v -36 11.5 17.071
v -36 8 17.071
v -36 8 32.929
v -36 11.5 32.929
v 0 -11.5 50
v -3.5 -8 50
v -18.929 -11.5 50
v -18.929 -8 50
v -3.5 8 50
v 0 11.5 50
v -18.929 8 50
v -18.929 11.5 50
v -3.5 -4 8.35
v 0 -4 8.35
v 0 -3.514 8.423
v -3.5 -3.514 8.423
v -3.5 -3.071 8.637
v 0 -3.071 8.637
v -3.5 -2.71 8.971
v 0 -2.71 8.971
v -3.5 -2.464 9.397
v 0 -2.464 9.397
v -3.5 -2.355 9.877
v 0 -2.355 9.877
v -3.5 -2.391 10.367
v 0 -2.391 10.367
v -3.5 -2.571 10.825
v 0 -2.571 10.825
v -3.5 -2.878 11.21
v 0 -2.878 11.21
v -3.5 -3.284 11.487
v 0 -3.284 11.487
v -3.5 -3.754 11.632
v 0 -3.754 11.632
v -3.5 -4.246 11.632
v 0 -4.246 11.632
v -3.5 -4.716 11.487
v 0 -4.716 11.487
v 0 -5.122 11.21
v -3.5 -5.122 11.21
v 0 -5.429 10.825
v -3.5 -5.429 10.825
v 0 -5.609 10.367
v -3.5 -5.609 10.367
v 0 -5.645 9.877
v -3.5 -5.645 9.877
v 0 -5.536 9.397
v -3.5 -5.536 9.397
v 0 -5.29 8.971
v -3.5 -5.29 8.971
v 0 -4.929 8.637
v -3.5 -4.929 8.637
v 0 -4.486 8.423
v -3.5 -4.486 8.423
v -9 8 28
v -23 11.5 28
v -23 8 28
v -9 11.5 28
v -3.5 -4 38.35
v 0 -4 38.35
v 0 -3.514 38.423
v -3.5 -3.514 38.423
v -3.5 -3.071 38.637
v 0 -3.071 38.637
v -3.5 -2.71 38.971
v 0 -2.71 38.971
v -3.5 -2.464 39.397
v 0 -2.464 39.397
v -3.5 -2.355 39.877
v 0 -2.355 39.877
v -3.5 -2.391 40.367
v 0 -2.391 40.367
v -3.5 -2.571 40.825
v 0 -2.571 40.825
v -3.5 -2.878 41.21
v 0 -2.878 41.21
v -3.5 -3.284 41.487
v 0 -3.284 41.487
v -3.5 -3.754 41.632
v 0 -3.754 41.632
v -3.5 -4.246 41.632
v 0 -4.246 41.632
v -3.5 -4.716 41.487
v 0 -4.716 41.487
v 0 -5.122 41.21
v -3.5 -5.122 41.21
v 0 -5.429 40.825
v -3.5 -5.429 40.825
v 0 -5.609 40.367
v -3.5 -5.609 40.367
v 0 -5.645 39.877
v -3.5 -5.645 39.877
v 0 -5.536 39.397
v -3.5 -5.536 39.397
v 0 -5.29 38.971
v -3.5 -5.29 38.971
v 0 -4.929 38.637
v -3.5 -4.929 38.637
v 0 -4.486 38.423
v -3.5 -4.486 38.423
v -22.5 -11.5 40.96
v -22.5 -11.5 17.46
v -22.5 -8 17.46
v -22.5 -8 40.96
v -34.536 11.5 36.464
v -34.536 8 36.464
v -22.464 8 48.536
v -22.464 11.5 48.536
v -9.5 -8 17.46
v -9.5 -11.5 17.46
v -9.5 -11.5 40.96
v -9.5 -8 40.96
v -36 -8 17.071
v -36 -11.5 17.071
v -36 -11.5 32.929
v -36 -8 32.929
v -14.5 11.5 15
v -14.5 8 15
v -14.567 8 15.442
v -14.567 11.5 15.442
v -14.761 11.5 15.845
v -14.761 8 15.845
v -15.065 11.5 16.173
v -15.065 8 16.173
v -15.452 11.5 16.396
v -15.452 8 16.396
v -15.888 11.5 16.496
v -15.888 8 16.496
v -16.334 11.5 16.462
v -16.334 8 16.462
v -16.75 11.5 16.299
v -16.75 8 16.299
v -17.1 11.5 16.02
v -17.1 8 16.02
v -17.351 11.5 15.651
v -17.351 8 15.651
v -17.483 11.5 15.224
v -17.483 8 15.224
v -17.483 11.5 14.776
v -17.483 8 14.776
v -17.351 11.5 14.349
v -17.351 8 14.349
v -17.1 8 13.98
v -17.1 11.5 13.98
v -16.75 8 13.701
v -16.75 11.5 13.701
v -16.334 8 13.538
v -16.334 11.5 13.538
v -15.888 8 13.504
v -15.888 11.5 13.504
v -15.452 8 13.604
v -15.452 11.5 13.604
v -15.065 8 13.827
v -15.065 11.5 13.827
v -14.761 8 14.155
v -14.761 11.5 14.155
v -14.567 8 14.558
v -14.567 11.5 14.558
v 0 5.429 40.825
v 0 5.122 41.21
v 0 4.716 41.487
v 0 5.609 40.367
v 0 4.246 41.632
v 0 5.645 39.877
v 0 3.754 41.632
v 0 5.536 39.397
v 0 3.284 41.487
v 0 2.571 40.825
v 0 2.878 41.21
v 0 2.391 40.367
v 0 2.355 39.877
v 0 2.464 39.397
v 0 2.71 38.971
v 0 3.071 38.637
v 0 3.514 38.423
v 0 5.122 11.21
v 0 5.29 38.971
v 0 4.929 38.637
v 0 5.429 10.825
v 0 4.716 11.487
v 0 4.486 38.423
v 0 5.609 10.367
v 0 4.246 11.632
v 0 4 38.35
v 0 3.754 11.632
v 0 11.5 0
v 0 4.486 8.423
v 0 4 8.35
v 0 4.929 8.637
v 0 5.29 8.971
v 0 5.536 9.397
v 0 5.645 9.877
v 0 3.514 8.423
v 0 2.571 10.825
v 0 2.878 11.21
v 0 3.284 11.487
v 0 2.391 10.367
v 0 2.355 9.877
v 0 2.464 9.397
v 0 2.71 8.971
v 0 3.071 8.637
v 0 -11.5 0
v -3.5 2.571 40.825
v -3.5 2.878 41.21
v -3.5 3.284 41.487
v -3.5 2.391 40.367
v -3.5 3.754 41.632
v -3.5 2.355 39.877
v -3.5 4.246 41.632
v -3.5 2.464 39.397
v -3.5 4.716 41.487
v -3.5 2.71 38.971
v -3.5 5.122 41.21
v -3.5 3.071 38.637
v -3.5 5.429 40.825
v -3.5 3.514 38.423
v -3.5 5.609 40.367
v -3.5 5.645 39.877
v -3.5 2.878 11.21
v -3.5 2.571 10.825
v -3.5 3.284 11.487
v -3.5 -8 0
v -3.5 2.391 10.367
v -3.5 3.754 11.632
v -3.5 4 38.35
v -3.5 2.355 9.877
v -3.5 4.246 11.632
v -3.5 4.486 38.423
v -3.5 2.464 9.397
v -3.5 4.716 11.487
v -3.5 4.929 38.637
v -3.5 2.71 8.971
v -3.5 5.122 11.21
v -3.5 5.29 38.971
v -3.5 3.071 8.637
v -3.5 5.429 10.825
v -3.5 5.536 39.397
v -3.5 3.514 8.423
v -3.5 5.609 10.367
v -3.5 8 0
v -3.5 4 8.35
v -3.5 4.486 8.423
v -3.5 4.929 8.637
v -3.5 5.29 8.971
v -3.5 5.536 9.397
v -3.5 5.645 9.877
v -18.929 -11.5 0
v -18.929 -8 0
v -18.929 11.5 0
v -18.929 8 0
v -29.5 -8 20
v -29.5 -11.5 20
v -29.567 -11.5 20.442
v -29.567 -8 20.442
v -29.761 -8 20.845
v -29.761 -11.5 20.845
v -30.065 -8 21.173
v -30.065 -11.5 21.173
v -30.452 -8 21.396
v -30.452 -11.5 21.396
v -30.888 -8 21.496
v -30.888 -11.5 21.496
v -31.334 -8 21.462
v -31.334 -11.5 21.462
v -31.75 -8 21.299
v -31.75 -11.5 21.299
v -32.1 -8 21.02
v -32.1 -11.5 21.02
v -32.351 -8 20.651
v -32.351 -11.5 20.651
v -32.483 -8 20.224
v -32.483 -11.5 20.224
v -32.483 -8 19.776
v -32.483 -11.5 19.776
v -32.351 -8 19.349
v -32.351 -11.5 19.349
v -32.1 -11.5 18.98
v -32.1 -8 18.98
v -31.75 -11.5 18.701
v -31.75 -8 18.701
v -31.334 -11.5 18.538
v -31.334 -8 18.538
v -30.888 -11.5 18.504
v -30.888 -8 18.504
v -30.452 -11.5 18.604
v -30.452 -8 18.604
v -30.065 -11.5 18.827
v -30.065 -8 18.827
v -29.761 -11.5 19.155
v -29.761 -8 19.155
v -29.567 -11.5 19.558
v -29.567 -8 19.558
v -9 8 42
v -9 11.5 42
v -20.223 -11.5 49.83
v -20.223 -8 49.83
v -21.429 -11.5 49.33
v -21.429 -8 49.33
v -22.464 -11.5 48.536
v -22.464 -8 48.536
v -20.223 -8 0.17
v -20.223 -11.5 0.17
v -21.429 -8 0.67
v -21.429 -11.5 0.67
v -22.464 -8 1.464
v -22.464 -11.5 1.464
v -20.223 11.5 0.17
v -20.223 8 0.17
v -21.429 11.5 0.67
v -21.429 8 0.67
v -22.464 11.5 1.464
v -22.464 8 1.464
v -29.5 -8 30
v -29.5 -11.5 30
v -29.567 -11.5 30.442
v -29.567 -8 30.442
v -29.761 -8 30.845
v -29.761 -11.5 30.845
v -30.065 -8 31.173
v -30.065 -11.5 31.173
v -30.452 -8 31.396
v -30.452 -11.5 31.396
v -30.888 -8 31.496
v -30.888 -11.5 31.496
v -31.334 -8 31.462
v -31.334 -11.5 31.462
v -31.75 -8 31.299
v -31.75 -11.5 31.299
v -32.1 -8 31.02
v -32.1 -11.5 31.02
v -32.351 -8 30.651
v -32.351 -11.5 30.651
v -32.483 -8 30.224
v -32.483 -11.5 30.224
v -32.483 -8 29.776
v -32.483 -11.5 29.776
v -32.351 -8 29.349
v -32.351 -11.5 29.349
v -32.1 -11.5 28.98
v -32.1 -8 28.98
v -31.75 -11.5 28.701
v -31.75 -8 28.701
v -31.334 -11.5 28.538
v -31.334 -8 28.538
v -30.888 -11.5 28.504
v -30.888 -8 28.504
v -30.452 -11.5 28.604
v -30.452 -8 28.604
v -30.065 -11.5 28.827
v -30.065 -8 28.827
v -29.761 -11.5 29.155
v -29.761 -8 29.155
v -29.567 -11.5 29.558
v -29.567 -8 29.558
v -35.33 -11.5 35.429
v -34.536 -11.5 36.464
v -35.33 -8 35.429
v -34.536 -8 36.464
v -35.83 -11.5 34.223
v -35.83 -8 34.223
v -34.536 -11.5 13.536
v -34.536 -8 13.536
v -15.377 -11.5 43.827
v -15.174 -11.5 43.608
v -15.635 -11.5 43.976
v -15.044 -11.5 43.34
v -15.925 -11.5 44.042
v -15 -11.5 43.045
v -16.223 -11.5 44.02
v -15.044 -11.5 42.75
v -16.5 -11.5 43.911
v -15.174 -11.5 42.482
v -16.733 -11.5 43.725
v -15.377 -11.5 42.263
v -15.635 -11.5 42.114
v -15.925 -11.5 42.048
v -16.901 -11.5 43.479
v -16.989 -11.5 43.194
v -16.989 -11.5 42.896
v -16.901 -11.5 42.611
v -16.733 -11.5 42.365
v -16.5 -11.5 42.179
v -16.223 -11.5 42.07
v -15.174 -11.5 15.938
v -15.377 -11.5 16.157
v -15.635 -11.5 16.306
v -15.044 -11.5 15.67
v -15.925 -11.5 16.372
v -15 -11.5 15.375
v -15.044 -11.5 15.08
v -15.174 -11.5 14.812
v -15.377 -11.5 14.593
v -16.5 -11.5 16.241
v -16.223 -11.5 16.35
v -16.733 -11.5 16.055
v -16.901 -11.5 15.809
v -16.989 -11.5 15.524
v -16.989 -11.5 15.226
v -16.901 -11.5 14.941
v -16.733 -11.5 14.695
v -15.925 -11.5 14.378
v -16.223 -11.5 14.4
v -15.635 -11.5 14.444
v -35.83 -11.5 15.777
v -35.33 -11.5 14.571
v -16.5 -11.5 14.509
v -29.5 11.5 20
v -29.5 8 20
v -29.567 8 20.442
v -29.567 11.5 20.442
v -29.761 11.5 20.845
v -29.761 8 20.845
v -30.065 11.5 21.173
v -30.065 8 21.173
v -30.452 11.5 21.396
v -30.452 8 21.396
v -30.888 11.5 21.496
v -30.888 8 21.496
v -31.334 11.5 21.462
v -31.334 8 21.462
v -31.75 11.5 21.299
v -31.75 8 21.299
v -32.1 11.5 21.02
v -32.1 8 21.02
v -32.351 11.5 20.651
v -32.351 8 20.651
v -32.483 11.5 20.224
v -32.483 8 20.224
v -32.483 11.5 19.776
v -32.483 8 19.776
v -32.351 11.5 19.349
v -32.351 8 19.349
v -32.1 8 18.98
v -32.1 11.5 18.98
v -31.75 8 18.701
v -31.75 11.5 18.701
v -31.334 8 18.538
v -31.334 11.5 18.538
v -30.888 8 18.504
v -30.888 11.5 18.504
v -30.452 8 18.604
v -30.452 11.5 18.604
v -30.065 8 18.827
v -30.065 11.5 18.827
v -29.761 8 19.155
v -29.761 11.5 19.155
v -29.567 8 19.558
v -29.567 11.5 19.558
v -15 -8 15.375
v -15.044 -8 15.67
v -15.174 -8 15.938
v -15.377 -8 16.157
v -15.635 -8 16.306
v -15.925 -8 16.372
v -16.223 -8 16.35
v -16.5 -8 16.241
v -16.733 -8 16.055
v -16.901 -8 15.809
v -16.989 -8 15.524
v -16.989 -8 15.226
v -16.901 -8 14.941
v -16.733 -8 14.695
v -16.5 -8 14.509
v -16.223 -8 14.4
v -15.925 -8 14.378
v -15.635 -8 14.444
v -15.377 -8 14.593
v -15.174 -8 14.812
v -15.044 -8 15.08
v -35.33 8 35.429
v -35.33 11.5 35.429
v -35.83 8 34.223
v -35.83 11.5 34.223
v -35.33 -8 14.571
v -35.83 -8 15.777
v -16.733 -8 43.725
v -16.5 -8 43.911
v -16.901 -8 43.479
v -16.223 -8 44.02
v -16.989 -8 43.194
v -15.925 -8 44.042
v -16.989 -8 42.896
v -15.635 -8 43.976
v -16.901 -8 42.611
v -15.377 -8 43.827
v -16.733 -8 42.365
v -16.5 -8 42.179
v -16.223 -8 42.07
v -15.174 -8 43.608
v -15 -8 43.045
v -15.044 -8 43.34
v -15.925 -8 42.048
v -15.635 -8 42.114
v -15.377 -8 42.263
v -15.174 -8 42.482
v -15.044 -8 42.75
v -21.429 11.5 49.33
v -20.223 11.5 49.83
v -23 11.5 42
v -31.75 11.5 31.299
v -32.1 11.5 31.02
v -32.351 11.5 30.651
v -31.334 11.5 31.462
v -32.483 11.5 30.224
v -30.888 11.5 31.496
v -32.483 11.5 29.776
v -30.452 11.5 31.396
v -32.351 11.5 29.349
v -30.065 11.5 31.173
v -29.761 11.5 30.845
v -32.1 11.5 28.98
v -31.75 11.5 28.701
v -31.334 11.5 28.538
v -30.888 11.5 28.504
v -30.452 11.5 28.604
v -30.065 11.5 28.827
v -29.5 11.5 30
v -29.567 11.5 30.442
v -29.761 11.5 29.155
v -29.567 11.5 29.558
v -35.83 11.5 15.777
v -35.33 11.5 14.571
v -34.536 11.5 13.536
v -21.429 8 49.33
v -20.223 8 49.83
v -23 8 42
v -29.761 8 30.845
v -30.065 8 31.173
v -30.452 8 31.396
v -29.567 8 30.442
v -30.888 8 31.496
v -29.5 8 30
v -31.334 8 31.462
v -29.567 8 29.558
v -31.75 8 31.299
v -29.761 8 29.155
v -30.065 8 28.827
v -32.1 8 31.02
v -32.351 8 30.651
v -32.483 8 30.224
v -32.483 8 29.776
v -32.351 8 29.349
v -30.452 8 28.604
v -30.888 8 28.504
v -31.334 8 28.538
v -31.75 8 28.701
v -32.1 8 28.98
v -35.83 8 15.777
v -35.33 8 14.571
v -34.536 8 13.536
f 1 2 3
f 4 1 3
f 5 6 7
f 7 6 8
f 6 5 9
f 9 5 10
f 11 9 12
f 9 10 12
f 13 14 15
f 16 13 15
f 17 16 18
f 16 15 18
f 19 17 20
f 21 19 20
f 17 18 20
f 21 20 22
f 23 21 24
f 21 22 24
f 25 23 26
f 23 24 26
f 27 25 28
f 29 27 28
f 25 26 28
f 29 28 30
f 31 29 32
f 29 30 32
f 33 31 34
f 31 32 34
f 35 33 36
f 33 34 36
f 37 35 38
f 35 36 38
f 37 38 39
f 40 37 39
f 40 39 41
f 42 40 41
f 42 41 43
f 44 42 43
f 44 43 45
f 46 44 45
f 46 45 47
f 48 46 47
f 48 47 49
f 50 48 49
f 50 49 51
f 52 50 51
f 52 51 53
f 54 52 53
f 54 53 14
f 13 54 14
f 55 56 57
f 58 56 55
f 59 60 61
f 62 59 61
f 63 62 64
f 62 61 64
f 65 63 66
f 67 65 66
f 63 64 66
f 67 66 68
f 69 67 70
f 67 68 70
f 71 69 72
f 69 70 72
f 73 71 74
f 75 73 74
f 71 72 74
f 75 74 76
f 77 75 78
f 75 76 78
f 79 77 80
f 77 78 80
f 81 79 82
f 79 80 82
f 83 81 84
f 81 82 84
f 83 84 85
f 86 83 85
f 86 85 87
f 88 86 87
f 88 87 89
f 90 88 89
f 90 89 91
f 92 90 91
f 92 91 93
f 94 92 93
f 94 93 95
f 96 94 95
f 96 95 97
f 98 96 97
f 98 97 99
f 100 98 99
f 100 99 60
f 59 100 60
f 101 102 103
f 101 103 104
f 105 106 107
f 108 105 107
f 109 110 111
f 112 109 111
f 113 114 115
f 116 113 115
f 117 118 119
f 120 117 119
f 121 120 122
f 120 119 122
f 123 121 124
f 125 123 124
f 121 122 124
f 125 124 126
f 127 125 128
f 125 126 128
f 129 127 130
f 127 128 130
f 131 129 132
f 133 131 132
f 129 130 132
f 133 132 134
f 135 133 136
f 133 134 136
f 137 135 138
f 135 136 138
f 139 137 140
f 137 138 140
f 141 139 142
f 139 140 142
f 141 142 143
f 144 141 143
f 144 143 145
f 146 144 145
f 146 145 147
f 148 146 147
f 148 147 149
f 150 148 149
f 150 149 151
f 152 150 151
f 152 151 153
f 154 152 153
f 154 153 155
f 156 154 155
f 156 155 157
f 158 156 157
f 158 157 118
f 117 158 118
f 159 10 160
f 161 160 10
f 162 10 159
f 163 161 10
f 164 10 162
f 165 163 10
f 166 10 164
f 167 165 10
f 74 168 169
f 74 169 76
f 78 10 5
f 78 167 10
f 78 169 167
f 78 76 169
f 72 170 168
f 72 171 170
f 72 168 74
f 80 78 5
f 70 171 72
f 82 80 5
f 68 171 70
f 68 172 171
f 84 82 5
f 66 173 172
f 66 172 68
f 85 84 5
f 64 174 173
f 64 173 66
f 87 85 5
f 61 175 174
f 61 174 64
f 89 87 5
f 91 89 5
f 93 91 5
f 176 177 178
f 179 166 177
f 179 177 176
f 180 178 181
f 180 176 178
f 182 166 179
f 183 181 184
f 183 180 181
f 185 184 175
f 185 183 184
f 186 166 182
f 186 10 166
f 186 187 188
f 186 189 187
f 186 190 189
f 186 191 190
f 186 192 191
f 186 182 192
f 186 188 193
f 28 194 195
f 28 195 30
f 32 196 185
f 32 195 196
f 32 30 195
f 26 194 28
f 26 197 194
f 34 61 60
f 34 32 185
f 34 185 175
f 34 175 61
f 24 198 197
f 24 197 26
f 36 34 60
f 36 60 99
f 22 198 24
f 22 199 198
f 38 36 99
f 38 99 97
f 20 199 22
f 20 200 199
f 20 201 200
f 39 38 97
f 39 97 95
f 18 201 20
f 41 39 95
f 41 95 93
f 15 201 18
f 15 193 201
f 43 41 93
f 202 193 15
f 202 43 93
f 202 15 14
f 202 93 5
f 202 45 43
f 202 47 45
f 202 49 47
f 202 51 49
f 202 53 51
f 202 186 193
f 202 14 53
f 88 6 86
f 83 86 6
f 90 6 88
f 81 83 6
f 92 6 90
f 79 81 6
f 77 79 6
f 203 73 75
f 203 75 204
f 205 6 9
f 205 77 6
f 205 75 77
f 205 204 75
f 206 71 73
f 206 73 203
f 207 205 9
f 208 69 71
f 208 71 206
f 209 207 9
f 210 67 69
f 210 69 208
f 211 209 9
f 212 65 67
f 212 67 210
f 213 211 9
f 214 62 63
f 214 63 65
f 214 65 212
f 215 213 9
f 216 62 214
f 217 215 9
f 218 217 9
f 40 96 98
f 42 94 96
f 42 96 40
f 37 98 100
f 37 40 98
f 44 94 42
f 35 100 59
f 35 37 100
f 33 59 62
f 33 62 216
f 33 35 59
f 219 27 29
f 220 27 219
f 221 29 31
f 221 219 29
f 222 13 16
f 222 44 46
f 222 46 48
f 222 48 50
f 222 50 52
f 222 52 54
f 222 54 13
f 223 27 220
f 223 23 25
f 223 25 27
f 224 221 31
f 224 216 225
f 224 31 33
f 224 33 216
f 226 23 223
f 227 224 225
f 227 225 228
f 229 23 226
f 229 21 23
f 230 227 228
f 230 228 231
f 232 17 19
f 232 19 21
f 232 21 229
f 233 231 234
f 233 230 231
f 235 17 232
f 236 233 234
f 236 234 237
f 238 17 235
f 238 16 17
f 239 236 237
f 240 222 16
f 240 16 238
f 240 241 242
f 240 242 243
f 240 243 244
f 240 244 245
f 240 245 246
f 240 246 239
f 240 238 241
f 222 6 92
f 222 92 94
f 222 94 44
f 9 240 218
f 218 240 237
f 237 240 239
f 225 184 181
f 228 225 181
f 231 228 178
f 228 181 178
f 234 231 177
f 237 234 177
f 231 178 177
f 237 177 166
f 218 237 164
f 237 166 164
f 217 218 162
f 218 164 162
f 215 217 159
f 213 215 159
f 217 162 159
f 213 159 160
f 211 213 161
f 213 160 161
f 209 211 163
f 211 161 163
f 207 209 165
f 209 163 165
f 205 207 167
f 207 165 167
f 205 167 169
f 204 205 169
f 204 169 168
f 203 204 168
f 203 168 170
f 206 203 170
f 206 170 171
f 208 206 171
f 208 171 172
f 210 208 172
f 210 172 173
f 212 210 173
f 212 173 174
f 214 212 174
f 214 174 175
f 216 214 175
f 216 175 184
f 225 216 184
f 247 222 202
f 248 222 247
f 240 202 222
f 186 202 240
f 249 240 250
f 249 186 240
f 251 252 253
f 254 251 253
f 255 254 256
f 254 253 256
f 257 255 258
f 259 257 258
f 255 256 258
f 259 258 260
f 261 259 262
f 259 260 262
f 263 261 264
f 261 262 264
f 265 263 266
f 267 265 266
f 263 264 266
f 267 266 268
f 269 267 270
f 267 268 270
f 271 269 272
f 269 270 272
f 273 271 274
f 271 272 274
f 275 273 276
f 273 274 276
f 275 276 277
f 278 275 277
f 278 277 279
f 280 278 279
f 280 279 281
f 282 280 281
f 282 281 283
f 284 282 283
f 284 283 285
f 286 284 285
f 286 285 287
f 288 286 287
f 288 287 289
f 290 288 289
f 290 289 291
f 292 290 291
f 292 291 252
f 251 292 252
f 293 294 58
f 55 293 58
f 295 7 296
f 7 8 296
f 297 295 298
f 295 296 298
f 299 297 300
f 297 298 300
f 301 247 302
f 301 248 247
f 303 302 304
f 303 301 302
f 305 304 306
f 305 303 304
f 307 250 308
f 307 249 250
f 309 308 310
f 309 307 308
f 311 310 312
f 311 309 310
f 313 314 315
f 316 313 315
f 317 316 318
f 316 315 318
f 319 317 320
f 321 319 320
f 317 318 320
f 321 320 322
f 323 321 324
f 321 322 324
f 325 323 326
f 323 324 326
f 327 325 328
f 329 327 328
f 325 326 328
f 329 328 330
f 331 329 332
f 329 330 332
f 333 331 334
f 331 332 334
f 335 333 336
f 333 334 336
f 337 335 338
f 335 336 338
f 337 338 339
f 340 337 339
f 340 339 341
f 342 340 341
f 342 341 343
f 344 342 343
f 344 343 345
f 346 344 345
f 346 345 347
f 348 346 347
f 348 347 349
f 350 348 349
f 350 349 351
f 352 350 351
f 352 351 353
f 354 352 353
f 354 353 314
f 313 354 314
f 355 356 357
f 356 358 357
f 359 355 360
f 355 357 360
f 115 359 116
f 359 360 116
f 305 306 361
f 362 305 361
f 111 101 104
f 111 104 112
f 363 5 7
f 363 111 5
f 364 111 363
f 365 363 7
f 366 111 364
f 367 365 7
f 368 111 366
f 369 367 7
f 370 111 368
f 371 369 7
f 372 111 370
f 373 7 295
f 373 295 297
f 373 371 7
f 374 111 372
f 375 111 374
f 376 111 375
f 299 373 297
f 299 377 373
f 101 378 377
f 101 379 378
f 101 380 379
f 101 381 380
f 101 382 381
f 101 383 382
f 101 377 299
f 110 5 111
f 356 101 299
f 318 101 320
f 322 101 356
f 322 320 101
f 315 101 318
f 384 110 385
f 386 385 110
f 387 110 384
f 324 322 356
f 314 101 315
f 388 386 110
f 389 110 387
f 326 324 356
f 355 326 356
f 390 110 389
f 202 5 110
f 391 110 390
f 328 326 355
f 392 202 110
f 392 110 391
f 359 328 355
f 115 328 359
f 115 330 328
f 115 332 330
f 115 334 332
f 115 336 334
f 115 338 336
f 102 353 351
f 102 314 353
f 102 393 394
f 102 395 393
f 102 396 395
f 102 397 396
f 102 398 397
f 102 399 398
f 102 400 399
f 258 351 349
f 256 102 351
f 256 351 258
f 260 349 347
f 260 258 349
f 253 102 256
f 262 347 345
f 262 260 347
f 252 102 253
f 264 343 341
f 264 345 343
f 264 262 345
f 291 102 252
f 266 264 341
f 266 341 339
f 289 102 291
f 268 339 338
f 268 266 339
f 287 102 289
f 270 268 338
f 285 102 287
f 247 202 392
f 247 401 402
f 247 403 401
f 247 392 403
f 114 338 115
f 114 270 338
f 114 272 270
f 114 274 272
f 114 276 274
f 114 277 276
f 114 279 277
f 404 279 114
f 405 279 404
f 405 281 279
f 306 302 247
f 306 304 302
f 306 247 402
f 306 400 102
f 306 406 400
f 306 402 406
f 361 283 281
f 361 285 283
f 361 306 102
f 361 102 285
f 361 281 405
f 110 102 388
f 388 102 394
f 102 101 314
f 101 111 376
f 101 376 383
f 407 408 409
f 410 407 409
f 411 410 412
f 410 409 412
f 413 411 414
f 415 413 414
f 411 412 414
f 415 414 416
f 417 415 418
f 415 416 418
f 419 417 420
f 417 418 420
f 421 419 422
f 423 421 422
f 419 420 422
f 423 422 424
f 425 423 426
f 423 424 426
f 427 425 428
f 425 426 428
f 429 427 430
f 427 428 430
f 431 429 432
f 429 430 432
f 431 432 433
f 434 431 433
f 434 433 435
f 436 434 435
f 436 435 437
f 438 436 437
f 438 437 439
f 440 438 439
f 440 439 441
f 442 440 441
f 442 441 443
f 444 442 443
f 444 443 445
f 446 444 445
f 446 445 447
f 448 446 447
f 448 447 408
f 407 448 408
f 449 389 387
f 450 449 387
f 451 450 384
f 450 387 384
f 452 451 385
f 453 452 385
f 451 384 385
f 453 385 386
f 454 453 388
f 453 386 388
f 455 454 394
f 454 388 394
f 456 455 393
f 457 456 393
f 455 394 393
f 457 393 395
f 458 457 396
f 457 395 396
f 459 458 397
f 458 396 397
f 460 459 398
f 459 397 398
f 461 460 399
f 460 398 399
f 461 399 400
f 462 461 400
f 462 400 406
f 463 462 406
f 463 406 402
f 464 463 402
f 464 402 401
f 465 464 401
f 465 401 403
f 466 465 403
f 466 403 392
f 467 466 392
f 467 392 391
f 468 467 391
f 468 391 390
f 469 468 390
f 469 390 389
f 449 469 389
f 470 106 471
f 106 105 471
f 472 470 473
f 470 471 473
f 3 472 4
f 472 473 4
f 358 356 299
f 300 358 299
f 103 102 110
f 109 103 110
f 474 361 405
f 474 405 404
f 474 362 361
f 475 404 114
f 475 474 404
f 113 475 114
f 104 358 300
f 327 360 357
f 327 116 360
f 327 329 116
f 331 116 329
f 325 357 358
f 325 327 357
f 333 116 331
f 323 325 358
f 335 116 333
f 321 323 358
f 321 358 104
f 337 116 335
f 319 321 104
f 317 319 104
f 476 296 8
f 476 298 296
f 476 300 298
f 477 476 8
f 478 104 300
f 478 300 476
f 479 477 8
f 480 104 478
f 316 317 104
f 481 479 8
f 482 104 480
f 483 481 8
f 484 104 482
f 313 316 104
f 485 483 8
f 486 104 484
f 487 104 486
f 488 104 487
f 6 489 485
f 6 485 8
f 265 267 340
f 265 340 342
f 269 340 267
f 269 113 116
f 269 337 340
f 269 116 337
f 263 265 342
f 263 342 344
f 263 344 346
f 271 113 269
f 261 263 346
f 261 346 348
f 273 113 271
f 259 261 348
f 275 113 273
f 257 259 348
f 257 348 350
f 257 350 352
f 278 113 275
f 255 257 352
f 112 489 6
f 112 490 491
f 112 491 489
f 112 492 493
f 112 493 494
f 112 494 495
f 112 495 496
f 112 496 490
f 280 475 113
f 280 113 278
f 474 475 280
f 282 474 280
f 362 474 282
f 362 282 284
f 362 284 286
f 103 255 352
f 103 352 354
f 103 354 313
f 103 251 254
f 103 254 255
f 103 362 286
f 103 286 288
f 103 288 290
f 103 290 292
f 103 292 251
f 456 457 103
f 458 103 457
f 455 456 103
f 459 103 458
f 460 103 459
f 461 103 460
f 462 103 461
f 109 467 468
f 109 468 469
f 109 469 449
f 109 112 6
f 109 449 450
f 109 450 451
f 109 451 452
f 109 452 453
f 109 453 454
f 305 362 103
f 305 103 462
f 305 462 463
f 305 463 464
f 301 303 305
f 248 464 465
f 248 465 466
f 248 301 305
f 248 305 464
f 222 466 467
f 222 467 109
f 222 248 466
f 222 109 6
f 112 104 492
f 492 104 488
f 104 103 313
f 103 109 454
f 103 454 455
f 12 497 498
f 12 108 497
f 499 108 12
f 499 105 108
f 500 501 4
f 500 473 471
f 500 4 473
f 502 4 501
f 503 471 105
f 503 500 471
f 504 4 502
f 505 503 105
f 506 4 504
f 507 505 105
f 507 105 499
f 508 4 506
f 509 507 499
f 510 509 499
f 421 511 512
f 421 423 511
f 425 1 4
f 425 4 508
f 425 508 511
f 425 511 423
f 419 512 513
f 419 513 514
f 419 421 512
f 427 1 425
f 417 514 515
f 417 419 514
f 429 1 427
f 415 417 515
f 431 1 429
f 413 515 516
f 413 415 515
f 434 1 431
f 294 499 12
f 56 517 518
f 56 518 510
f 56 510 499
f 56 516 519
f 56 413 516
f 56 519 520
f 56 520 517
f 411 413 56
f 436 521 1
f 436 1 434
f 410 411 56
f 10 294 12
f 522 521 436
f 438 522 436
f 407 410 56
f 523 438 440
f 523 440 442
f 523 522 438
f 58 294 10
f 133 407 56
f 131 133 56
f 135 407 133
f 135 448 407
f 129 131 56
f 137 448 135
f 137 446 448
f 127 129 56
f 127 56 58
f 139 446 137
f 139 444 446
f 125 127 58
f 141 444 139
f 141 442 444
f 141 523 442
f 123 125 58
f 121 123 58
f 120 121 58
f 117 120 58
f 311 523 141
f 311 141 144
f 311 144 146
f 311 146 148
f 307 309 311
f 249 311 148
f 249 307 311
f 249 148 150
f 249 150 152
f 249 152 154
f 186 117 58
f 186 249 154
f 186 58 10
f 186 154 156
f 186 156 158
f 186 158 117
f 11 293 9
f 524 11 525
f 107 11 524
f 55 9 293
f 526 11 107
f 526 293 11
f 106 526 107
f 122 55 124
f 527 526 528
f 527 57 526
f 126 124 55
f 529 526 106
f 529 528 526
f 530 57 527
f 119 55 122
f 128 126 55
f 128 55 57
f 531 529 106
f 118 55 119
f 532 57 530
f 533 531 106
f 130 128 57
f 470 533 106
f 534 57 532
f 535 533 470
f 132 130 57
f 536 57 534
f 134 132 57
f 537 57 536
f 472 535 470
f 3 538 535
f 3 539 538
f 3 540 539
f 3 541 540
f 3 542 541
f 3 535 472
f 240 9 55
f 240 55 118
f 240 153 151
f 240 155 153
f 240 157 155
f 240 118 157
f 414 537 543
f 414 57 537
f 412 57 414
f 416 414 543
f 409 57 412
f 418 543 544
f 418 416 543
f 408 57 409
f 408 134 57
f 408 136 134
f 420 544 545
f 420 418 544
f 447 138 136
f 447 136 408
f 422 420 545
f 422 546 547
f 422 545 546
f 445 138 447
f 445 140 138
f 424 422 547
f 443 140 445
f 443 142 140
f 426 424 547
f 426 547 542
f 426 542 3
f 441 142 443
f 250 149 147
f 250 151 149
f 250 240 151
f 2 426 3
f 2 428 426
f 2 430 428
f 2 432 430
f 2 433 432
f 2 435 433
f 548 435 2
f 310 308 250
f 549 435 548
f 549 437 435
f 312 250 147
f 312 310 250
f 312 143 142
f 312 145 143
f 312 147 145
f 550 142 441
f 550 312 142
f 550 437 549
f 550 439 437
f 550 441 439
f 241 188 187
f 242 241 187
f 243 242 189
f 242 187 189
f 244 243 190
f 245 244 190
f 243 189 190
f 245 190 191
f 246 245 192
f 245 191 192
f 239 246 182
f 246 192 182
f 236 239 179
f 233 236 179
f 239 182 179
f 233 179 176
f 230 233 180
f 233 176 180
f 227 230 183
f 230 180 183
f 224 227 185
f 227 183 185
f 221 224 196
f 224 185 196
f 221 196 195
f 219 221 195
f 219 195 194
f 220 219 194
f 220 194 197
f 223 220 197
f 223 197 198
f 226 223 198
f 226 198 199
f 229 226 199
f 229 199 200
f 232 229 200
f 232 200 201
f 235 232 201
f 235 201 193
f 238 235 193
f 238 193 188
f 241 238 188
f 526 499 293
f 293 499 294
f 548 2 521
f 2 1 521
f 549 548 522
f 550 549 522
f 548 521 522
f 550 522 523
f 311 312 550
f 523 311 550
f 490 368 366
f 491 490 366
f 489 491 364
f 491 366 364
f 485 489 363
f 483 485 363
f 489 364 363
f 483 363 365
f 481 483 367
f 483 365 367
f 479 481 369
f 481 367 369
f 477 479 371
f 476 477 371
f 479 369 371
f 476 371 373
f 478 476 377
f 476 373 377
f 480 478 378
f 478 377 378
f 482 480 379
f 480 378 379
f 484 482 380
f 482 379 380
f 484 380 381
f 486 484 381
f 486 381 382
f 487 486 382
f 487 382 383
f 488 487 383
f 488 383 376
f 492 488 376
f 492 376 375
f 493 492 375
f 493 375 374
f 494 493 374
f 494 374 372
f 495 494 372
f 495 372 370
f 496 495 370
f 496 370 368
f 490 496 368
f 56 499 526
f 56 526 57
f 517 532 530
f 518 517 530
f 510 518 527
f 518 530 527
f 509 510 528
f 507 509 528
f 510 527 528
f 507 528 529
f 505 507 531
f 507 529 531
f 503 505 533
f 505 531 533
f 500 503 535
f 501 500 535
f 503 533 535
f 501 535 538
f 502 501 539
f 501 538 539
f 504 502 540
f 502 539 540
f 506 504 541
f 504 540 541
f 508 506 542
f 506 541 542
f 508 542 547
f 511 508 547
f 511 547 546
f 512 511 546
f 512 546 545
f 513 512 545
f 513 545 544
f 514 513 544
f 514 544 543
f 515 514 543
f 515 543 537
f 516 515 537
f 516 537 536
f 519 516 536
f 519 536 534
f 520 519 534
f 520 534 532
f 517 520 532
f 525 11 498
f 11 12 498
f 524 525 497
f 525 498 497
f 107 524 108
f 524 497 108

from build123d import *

# Parameters (mm, degrees)
EXTRUDE_1_DEPTH     = 50
CUT_EXTRUDE_START   = -19.5
SKETCH_2_R          = 1.5
CUT_EXTRUDE_1_DEPTH = 70
SKETCH_3_OUTSIDE_W  = 61.218
SKETCH_3_OUTSIDE_H  = 66.218
CUT_EXTRUDE_2_DEPTH = 70
SKETCH_2_3_R        = 1.5
CUT_EXTRUDE_4_DEPTH = 10
SKETCH_5_R          = 1
CUT_EXTRUDE_5_DEPTH = 10
FILLET_1_R          = 5
SKETCH_6_W          = 13
SKETCH_6_H          = 23.5
CUT_EXTRUDE_6_DEPTH = 10
SKETCH_7_R          = 1.65
CUT_EXTRUDE_7_DEPTH = 10
SKETCH_8_W          = 14
SKETCH_8_H          = 14
CUT_EXTRUDE_8_DEPTH = 10


with BuildPart() as part:
    # 草图1 → 凸台-拉伸1 (new body)
    with BuildSketch(Plane.XY):
        Polygon((-45, 11.5), (0, 11.5), (0, -11.5), (-45, -11.5), (-45, -8), (-3.5, -8), (-3.5, 8), (-45, 8), align=None)
    extrude(amount=EXTRUDE_1_DEPTH)

    # 草图2 → 切除-拉伸1 (cut)
    with BuildSketch(Plane.XZ.offset(11.5).offset(CUT_EXTRUDE_START)):
        with Locations((-16, 35)):
            Circle(SKETCH_2_R)
        with Locations((-16, 15)):
            Circle(SKETCH_2_R)
        with Locations((-31, 30)):
            Circle(SKETCH_2_R)
        with Locations((-31, 20)):
            Circle(SKETCH_2_R)
    extrude(amount=-CUT_EXTRUDE_1_DEPTH, mode=Mode.SUBTRACT)

    # 草图3 outside → 切除-拉伸2 (cut)
    with BuildSketch(Plane.XZ.offset(11.5)):
        with Locations((-22.5, 25)):
            Rectangle(SKETCH_3_OUTSIDE_W, SKETCH_3_OUTSIDE_H)
        Polygon((-21, 0), (-36, 15), (-36, 35), (-21, 50), (0, 50), (0, 0), align=None, mode=Mode.SUBTRACT)
    extrude(amount=-CUT_EXTRUDE_2_DEPTH, mode=Mode.SUBTRACT)

    # 草图2<3> → 切除-拉伸4 (cut)
    with BuildSketch(Plane.XZ.offset(11.5)):
        with Locations((-31, 30)):
            Circle(SKETCH_2_3_R)
        with Locations((-31, 20)):
            Circle(SKETCH_2_3_R)
    extrude(amount=-CUT_EXTRUDE_4_DEPTH, mode=Mode.SUBTRACT)

    # 草图5 → 切除-拉伸5 (cut)
    with BuildSketch(Plane.XZ.offset(11.5)):
        with Locations((-16, 43.045)):
            Circle(SKETCH_5_R)
        with Locations((-16, 15.375)):
            Circle(SKETCH_5_R)
    extrude(amount=-CUT_EXTRUDE_5_DEPTH, mode=Mode.SUBTRACT)

    # 圆角1
    fillet_1_edges = [part.edges().sort_by_distance(p)[0] for p in [
        (-21, -9.75, 0),
        (-21, 9.75, 0),
        (-21, -9.75, 50),
        (-21, 9.75, 50),
        (-36, 9.75, 35),
        (-36, -9.75, 35),
        (-36, 9.75, 15),
        (-36, -9.75, 15),
    ]]
    fillet(fillet_1_edges, radius=FILLET_1_R)

    # 草图6 → 切除-拉伸6 (cut)
    with BuildSketch(Plane.XZ.offset(11.5)):
        with Locations((-16, 29.21)):
            Rectangle(SKETCH_6_W, SKETCH_6_H)
    extrude(amount=-CUT_EXTRUDE_6_DEPTH, mode=Mode.SUBTRACT)

    # 草图7 → 切除-拉伸7 (cut)
    with BuildSketch(Plane(origin=(0, 0, 0), x_dir=(0, 0, -1), z_dir=(1, 0, 0))):
        with Locations((-10, 4)):
            Circle(SKETCH_7_R)
        with Locations((-40, 4)):
            Circle(SKETCH_7_R)
        with Locations((-10, -4)):
            Circle(SKETCH_7_R)
        with Locations((-40, -4)):
            Circle(SKETCH_7_R)
    extrude(amount=-CUT_EXTRUDE_7_DEPTH, mode=Mode.SUBTRACT)

    # 草图8 → 切除-拉伸8 (cut)
    with BuildSketch(Plane(origin=(0, 11.5, 0), x_dir=(1, 0, 0), z_dir=(0, 1, 0))):
        with Locations((-16, -35)):
            Rectangle(SKETCH_8_W, SKETCH_8_H)
    extrude(amount=-CUT_EXTRUDE_8_DEPTH, mode=Mode.SUBTRACT)


solid = part.part
